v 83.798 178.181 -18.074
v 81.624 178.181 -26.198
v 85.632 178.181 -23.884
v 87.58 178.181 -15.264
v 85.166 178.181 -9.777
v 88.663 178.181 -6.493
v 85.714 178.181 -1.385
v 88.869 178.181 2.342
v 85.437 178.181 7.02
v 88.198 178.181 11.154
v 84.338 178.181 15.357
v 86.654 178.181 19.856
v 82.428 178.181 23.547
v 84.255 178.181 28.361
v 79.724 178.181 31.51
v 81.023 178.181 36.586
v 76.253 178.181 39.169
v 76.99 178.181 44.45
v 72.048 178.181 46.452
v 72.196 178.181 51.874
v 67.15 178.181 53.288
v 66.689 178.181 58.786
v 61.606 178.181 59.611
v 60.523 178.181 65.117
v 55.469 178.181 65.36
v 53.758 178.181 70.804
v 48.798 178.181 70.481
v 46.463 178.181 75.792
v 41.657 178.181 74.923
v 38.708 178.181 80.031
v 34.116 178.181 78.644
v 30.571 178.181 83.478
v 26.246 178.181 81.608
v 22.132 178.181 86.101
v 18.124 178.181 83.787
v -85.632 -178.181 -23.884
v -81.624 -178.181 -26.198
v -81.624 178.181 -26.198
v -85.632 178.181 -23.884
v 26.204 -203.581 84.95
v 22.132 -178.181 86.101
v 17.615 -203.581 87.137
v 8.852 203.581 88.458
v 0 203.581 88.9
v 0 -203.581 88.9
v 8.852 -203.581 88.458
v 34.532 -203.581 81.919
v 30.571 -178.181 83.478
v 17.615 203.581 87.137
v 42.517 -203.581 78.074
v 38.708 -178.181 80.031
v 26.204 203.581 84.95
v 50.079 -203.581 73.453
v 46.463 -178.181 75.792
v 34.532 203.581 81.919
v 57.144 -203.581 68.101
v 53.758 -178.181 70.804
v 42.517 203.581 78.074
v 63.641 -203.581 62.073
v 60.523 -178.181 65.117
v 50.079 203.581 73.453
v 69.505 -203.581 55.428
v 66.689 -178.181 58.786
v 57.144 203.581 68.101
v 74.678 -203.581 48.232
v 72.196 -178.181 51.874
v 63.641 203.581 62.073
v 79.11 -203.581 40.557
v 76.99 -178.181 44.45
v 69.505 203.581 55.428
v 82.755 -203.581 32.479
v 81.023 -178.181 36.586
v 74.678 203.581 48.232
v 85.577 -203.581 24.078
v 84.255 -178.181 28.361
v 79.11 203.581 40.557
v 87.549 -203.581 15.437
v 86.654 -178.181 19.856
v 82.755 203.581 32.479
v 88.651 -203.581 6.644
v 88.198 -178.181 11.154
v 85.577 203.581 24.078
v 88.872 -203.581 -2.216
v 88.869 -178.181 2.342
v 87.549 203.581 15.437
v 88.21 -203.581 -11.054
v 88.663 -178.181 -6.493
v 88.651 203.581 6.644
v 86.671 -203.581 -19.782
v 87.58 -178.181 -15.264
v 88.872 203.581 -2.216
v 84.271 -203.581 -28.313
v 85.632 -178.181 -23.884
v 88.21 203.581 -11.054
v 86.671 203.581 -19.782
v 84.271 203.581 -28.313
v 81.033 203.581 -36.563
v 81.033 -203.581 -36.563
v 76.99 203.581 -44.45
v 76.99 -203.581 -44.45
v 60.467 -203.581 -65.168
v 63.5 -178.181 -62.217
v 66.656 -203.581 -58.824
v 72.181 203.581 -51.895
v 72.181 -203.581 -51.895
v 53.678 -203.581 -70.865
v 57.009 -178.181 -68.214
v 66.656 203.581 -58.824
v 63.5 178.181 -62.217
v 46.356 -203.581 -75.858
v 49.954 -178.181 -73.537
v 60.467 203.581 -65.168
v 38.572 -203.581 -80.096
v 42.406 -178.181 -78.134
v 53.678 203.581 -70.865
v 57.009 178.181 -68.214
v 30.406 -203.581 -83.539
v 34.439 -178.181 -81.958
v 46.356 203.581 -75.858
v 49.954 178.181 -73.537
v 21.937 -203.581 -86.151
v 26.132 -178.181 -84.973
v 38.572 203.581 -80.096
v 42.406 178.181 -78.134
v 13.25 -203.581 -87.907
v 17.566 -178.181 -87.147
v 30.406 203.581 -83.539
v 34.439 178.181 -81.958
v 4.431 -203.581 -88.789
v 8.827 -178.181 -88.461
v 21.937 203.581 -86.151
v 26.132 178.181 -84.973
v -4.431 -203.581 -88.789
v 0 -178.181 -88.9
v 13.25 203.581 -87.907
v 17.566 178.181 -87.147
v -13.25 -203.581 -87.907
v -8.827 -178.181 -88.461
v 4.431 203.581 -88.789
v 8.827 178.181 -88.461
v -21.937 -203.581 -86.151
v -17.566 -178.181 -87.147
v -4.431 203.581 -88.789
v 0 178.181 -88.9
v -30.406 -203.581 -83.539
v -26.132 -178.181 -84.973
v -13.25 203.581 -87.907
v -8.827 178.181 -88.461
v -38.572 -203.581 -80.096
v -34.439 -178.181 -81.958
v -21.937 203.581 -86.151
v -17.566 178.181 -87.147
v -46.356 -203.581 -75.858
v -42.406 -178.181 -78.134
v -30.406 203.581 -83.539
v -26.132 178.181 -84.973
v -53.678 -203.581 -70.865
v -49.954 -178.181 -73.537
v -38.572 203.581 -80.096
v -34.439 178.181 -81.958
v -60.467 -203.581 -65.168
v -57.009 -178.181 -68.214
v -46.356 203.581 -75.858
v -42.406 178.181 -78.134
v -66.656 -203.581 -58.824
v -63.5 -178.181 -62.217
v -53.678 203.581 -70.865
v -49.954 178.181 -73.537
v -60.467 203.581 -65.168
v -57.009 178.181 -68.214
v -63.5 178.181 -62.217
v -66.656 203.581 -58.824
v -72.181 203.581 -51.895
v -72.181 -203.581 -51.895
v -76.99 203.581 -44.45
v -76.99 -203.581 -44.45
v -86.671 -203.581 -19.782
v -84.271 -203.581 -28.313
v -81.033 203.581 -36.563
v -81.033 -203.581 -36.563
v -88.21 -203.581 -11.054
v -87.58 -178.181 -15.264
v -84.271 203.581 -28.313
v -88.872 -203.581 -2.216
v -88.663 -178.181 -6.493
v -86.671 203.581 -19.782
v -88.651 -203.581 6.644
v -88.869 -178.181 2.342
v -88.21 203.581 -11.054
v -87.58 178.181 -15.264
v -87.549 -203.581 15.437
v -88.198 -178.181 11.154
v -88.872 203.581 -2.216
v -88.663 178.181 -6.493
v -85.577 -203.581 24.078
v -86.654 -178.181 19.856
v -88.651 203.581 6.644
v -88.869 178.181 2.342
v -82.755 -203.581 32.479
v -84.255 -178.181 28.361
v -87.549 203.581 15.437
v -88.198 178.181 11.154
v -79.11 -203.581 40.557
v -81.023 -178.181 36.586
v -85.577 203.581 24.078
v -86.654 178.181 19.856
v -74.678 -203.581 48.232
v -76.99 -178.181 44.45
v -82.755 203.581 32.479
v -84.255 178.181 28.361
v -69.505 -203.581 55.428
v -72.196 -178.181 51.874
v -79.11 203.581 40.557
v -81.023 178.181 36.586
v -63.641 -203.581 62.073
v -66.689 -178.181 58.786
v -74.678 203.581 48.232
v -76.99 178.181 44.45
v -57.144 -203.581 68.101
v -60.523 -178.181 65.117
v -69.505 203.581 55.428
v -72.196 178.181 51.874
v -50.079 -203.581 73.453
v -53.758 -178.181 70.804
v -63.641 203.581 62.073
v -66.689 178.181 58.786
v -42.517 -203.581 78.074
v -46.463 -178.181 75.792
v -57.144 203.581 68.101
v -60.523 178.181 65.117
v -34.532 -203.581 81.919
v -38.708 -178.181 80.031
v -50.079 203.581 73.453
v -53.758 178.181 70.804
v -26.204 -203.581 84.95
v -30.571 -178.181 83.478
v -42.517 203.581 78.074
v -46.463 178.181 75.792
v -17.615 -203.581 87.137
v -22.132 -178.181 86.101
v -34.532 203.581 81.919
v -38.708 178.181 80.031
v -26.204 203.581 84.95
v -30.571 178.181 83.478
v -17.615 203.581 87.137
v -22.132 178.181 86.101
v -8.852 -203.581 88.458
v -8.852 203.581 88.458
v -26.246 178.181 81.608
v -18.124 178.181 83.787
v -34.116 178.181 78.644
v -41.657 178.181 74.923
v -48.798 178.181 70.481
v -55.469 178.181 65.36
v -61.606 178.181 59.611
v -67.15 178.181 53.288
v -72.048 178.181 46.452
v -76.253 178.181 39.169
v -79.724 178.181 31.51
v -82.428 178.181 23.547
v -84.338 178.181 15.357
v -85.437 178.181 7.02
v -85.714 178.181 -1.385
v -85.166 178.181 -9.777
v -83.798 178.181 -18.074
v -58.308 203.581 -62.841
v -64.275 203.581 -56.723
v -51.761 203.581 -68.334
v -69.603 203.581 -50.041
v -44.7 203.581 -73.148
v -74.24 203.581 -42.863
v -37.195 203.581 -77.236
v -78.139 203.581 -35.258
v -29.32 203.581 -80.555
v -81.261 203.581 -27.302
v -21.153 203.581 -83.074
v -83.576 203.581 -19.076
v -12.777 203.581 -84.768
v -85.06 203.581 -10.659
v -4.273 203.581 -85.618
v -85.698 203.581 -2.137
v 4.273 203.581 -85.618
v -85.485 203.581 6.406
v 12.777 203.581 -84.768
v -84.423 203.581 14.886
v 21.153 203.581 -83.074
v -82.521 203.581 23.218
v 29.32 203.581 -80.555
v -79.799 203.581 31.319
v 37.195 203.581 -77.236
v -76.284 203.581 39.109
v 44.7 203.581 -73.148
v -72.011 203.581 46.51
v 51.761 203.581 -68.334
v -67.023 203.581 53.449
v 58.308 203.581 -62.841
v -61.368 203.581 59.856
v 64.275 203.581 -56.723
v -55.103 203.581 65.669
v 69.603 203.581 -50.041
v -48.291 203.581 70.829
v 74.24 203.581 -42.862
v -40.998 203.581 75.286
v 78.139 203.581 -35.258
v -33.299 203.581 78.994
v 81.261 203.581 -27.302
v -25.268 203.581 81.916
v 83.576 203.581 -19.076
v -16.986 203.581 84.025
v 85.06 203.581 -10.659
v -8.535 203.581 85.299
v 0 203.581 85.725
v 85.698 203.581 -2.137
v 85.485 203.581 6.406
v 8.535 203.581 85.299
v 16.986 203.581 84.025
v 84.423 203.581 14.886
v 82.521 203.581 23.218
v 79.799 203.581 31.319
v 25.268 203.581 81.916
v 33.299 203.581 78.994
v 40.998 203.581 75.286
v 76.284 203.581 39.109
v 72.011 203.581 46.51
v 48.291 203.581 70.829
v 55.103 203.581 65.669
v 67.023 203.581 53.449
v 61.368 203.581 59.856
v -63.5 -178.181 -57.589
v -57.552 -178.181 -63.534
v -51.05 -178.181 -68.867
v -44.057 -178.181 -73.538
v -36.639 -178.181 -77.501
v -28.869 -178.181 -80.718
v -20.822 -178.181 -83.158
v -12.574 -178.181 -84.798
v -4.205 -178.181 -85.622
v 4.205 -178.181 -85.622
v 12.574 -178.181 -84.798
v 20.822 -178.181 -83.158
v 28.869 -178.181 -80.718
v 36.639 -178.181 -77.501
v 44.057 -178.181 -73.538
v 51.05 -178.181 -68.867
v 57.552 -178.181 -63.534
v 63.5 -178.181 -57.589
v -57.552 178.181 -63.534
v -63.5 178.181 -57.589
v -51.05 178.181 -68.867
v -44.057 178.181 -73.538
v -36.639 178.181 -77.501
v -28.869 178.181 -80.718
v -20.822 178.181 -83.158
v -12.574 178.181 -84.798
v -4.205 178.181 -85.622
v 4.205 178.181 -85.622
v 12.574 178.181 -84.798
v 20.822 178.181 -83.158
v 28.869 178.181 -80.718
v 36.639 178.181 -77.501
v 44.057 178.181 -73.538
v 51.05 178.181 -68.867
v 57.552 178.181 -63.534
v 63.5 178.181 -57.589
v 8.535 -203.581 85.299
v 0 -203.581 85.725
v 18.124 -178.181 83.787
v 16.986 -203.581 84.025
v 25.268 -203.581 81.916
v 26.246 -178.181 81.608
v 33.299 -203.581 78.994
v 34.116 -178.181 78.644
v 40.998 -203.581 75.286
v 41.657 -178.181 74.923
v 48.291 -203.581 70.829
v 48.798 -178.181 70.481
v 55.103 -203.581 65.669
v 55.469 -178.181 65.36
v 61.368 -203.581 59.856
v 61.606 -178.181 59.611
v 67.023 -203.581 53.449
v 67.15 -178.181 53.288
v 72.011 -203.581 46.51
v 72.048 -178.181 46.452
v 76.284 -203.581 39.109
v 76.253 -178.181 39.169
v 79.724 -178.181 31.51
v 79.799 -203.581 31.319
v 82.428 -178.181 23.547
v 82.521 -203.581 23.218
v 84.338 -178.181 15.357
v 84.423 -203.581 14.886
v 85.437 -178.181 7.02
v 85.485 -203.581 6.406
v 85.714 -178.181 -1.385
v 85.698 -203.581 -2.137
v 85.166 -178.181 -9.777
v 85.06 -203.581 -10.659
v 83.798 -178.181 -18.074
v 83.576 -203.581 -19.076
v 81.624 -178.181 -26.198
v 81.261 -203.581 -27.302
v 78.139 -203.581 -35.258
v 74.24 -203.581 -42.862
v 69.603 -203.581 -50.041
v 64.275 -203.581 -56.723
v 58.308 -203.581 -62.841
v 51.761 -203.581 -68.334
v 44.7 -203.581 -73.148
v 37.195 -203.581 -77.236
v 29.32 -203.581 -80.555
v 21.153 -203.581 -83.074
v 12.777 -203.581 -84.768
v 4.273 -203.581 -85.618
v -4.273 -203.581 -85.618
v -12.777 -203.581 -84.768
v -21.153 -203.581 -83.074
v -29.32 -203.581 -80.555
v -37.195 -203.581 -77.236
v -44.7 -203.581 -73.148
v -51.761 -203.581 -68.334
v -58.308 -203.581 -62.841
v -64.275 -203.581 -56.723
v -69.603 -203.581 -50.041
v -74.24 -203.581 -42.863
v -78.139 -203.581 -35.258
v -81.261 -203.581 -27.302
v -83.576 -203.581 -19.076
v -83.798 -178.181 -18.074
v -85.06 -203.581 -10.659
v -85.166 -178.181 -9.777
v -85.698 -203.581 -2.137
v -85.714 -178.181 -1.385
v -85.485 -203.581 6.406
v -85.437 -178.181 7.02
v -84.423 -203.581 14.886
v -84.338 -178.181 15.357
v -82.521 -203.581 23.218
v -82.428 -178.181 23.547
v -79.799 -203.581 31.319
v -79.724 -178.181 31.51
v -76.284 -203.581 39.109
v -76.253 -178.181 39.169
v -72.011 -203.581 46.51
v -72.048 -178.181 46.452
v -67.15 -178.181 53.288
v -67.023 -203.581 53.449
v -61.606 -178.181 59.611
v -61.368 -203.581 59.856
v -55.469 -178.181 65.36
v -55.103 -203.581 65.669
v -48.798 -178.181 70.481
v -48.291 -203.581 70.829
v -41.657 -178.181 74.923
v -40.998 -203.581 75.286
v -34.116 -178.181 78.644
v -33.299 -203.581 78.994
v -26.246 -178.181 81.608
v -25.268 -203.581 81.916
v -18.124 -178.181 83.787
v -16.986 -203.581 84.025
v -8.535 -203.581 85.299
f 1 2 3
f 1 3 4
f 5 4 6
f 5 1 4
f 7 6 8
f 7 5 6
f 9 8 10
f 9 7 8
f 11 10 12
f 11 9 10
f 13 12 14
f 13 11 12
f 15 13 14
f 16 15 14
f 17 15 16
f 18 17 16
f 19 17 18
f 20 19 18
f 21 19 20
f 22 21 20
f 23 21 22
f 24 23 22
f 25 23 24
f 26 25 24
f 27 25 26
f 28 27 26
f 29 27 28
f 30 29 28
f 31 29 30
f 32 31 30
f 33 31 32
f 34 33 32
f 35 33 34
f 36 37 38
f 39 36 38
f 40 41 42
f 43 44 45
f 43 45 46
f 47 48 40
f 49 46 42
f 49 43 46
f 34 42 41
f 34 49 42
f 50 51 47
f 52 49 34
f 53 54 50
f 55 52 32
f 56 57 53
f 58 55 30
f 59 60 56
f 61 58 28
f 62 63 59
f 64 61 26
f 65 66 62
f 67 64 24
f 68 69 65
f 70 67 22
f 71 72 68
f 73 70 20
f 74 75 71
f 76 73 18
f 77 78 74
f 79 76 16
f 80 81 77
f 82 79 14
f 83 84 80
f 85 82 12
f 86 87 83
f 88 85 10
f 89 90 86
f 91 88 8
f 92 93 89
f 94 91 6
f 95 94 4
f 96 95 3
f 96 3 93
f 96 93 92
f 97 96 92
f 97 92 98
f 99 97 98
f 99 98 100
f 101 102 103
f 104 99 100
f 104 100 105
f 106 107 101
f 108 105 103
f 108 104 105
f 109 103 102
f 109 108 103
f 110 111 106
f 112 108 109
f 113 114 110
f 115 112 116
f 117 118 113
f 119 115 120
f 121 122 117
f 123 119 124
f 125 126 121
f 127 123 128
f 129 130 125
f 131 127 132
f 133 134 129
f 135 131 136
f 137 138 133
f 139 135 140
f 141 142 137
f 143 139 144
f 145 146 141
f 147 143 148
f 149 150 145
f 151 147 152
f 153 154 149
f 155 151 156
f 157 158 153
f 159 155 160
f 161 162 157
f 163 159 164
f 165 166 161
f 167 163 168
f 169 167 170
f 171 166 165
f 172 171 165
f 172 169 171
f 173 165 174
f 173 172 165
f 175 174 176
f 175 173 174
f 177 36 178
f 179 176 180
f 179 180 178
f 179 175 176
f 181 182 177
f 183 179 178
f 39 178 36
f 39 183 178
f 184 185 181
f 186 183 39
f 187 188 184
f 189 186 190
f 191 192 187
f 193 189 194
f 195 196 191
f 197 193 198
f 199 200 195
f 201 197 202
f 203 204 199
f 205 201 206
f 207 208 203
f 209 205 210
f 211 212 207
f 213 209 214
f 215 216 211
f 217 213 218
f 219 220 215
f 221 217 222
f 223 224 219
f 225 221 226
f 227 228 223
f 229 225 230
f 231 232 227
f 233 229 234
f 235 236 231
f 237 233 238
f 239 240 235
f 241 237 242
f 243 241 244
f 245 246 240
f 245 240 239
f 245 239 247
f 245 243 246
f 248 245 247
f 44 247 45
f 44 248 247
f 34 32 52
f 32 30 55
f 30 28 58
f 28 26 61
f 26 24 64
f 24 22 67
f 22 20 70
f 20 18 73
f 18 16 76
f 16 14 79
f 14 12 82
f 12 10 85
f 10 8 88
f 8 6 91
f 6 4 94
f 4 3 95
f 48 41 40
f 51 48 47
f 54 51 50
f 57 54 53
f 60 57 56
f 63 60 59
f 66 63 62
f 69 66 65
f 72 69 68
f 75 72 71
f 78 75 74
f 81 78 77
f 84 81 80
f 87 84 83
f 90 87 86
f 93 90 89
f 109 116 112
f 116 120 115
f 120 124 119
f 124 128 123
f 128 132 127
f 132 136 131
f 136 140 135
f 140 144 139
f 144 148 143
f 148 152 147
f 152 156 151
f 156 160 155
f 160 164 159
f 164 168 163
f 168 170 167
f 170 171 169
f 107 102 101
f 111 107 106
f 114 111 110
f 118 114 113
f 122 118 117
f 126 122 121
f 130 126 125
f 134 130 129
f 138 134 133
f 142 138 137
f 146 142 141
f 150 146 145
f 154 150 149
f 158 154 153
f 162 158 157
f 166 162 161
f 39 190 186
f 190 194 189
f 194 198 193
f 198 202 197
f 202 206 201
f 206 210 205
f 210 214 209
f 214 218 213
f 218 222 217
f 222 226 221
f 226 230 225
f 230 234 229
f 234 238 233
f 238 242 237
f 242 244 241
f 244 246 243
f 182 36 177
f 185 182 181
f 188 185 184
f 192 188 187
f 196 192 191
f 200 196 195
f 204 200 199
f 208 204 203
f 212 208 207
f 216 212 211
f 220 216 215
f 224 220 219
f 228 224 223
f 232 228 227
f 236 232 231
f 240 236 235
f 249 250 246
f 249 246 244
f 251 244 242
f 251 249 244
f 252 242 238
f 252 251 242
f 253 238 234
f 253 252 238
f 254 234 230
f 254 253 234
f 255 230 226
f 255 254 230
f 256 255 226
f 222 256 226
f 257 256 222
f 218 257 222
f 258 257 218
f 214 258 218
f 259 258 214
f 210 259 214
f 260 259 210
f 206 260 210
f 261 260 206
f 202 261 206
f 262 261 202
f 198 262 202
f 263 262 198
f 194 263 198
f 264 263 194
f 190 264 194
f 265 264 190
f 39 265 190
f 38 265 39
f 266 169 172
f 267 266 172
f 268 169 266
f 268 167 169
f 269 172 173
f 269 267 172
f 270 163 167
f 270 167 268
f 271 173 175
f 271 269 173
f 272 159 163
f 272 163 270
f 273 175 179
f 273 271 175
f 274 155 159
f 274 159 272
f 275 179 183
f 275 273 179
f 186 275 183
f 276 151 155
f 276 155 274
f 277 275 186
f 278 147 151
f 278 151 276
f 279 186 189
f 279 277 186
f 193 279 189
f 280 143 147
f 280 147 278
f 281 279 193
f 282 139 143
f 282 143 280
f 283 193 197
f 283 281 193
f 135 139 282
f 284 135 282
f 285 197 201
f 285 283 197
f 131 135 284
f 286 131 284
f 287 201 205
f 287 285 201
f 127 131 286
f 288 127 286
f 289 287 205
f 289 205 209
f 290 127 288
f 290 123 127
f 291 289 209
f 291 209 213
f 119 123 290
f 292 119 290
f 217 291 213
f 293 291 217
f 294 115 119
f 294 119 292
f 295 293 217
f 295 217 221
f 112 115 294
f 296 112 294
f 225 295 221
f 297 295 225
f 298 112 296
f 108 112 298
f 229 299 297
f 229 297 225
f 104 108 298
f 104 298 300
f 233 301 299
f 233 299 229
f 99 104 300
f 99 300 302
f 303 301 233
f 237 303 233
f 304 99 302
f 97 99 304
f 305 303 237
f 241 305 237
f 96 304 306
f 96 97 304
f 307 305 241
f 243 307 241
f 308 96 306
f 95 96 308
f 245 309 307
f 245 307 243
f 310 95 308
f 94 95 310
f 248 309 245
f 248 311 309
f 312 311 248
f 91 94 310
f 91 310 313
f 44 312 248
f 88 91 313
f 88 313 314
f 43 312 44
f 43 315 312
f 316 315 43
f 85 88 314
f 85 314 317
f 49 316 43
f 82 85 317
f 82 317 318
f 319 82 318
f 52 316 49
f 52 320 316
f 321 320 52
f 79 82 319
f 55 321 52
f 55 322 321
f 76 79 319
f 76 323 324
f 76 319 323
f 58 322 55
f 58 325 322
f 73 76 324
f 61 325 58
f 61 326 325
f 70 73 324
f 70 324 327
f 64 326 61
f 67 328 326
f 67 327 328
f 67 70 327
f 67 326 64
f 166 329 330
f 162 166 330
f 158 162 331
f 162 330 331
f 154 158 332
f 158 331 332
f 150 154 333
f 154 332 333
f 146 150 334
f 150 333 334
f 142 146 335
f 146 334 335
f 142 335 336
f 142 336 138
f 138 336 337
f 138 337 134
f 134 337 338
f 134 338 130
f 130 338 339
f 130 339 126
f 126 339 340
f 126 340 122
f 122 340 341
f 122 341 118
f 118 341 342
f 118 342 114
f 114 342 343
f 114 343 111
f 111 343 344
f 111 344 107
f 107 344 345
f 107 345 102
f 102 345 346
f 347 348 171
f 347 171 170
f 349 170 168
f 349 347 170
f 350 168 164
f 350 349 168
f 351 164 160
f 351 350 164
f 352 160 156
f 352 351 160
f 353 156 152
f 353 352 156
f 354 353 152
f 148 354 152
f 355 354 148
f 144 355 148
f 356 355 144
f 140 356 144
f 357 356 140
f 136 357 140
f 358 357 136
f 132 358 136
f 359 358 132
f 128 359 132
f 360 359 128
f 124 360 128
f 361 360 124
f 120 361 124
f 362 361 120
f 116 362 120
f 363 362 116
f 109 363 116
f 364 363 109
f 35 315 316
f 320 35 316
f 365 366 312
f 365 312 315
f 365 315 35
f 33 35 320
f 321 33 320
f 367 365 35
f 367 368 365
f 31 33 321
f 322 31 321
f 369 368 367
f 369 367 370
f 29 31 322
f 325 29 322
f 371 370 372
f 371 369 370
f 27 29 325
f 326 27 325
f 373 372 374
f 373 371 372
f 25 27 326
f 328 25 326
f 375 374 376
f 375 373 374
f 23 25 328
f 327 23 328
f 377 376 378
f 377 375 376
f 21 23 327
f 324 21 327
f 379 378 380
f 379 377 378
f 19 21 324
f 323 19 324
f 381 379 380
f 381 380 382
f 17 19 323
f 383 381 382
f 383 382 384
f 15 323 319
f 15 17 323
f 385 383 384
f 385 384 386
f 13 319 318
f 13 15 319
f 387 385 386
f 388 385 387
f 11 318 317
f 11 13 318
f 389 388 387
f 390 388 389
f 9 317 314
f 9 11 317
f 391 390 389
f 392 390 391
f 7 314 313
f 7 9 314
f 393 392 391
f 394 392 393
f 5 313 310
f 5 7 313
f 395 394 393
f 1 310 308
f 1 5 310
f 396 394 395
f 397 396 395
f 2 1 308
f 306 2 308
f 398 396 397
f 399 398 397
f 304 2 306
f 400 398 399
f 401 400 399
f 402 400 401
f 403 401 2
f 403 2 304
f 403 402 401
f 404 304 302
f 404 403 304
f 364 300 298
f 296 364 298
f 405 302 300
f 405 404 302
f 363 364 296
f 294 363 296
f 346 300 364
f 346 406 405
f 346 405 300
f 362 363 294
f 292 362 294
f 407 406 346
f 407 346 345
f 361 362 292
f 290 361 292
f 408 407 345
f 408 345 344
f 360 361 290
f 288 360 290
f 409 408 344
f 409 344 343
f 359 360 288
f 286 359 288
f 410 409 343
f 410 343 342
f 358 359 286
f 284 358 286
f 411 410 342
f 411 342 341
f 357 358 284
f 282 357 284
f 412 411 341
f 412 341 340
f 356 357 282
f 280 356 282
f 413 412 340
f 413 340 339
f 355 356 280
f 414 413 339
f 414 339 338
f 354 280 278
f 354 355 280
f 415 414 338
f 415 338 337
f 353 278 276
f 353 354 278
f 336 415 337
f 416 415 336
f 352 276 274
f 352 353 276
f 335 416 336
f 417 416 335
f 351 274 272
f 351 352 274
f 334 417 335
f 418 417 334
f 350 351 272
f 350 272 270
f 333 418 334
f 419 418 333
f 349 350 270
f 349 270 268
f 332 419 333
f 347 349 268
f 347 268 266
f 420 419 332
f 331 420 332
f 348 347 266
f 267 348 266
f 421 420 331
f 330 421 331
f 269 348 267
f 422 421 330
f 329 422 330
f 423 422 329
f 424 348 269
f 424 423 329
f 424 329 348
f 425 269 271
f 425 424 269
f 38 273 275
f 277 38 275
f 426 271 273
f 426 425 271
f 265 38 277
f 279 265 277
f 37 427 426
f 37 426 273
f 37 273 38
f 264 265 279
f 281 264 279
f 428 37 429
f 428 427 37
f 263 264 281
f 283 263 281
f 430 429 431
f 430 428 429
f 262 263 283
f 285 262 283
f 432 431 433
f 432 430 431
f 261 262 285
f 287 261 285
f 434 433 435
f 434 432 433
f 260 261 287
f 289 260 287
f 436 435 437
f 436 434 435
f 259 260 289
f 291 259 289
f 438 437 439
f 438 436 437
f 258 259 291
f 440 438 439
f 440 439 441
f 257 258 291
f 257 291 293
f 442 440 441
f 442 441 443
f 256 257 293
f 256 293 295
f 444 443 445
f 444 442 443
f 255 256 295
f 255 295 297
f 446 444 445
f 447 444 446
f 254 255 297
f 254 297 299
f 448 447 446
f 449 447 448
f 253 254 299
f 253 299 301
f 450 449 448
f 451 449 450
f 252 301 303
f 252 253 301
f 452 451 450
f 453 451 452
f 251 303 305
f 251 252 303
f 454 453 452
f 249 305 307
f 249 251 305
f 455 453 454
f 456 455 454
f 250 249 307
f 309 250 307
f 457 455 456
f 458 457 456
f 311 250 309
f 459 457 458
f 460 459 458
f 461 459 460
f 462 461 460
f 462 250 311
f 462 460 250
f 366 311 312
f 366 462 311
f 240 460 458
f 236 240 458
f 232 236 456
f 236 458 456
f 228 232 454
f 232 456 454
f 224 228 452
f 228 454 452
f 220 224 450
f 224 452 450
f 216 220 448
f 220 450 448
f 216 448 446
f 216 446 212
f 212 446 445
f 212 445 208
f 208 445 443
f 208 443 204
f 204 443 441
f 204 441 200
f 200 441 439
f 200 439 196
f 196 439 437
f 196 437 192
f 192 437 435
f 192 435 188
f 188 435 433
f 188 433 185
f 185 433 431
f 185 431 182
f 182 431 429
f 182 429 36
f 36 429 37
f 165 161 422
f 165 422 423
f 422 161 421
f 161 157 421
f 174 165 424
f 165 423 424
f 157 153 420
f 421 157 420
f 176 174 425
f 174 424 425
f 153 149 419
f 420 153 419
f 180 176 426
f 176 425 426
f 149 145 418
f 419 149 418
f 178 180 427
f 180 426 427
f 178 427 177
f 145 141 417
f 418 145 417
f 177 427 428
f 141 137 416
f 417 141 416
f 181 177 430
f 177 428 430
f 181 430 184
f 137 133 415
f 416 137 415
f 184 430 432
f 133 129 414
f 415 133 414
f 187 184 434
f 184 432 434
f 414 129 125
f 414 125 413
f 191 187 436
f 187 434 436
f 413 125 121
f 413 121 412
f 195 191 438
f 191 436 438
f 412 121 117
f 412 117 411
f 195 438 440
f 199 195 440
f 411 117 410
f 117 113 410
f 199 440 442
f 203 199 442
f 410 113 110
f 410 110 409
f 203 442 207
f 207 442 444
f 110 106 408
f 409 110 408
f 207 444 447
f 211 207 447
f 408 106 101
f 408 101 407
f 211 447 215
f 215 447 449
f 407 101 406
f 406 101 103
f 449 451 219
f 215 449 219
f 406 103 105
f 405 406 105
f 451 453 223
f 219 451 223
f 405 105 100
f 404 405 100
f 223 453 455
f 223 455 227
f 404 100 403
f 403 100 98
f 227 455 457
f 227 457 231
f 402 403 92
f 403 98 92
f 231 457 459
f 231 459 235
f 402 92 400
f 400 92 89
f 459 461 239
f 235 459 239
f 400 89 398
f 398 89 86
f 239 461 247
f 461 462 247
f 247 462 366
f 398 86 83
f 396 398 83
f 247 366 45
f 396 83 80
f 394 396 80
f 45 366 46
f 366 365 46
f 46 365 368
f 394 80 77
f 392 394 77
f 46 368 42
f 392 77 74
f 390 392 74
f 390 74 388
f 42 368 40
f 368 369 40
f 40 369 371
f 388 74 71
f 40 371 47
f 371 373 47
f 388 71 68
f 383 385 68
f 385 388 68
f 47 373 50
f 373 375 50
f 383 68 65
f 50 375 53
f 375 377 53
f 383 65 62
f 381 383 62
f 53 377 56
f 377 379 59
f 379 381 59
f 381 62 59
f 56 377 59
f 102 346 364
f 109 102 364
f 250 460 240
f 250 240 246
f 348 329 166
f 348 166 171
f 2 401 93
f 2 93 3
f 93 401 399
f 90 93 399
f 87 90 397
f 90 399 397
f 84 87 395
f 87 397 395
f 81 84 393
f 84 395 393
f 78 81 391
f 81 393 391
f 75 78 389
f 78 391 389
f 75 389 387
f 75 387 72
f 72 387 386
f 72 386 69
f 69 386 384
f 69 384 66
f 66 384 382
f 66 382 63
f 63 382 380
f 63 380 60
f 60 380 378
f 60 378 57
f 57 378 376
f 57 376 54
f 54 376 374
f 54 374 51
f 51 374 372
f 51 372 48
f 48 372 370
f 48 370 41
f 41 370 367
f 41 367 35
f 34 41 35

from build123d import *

# Parameters (mm, degrees)
SKETCH1_R               = 88.9
SKETCH1_R_2             = 85.725
BOSS_EXTRUDE1_DEPTH     = 203.581
CUT_EXTRUDE1_REACH      = 241.273
CUT_EXTRUDE1_END_RADIUS = 88.9
SKETCH2_W               = 127
SKETCH2_H               = 356.362
CIRPATTERN1_COUNT       = 3


with BuildPart() as part:
    # Sketch1 → Boss-Extrude1 (new, symmetric)
    with BuildSketch(Plane(origin=(0, 0, 0), x_dir=(1, 0, 0), z_dir=(0, 1, 0))):
        with Locations(Location((0, 0, 0), (0, 0, 270))):
            Circle(SKETCH1_R)
        with Locations(Location((0, 0, 0), (0, 0, 270))):
            Circle(SKETCH1_R_2, mode=Mode.SUBTRACT)
    extrude(amount=BOSS_EXTRUDE1_DEPTH, both=True)

    # Cut-Extrude1: up to this cylinder (the profile starts inside it)
    cut_extrude1_end = Plane(origin=(0, 0, 0), z_dir=(0, -1, 0)) * Cylinder(CUT_EXTRUDE1_END_RADIUS, 661.346, mode=Mode.PRIVATE)
    # Sketch2 → Cut-Extrude1 (cut, up to the surface)
    with BuildSketch(Plane.XY, mode=Mode.PRIVATE) as cut_extrude1_sk1:
        Rectangle(SKETCH2_W, SKETCH2_H)
    cut_extrude1_tool1 = extrude(cut_extrude1_sk1.sketch, amount=-CUT_EXTRUDE1_REACH, mode=Mode.PRIVATE) & cut_extrude1_end
    cut_extrude1 = cut_extrude1_tool1.solids().sort_by_distance((0, 0, 0))[0]
    add(cut_extrude1, mode=Mode.SUBTRACT)

    # CirPattern1: Cut-Extrude1 ×3 about axis
    cirpattern1_axis = Axis((0, 0, 0), (0, 1, 0))
    for i in range(1, CIRPATTERN1_COUNT):
        add(cut_extrude1.rotate(cirpattern1_axis, i * 360 / CIRPATTERN1_COUNT), mode=Mode.SUBTRACT)


solid = part.part
